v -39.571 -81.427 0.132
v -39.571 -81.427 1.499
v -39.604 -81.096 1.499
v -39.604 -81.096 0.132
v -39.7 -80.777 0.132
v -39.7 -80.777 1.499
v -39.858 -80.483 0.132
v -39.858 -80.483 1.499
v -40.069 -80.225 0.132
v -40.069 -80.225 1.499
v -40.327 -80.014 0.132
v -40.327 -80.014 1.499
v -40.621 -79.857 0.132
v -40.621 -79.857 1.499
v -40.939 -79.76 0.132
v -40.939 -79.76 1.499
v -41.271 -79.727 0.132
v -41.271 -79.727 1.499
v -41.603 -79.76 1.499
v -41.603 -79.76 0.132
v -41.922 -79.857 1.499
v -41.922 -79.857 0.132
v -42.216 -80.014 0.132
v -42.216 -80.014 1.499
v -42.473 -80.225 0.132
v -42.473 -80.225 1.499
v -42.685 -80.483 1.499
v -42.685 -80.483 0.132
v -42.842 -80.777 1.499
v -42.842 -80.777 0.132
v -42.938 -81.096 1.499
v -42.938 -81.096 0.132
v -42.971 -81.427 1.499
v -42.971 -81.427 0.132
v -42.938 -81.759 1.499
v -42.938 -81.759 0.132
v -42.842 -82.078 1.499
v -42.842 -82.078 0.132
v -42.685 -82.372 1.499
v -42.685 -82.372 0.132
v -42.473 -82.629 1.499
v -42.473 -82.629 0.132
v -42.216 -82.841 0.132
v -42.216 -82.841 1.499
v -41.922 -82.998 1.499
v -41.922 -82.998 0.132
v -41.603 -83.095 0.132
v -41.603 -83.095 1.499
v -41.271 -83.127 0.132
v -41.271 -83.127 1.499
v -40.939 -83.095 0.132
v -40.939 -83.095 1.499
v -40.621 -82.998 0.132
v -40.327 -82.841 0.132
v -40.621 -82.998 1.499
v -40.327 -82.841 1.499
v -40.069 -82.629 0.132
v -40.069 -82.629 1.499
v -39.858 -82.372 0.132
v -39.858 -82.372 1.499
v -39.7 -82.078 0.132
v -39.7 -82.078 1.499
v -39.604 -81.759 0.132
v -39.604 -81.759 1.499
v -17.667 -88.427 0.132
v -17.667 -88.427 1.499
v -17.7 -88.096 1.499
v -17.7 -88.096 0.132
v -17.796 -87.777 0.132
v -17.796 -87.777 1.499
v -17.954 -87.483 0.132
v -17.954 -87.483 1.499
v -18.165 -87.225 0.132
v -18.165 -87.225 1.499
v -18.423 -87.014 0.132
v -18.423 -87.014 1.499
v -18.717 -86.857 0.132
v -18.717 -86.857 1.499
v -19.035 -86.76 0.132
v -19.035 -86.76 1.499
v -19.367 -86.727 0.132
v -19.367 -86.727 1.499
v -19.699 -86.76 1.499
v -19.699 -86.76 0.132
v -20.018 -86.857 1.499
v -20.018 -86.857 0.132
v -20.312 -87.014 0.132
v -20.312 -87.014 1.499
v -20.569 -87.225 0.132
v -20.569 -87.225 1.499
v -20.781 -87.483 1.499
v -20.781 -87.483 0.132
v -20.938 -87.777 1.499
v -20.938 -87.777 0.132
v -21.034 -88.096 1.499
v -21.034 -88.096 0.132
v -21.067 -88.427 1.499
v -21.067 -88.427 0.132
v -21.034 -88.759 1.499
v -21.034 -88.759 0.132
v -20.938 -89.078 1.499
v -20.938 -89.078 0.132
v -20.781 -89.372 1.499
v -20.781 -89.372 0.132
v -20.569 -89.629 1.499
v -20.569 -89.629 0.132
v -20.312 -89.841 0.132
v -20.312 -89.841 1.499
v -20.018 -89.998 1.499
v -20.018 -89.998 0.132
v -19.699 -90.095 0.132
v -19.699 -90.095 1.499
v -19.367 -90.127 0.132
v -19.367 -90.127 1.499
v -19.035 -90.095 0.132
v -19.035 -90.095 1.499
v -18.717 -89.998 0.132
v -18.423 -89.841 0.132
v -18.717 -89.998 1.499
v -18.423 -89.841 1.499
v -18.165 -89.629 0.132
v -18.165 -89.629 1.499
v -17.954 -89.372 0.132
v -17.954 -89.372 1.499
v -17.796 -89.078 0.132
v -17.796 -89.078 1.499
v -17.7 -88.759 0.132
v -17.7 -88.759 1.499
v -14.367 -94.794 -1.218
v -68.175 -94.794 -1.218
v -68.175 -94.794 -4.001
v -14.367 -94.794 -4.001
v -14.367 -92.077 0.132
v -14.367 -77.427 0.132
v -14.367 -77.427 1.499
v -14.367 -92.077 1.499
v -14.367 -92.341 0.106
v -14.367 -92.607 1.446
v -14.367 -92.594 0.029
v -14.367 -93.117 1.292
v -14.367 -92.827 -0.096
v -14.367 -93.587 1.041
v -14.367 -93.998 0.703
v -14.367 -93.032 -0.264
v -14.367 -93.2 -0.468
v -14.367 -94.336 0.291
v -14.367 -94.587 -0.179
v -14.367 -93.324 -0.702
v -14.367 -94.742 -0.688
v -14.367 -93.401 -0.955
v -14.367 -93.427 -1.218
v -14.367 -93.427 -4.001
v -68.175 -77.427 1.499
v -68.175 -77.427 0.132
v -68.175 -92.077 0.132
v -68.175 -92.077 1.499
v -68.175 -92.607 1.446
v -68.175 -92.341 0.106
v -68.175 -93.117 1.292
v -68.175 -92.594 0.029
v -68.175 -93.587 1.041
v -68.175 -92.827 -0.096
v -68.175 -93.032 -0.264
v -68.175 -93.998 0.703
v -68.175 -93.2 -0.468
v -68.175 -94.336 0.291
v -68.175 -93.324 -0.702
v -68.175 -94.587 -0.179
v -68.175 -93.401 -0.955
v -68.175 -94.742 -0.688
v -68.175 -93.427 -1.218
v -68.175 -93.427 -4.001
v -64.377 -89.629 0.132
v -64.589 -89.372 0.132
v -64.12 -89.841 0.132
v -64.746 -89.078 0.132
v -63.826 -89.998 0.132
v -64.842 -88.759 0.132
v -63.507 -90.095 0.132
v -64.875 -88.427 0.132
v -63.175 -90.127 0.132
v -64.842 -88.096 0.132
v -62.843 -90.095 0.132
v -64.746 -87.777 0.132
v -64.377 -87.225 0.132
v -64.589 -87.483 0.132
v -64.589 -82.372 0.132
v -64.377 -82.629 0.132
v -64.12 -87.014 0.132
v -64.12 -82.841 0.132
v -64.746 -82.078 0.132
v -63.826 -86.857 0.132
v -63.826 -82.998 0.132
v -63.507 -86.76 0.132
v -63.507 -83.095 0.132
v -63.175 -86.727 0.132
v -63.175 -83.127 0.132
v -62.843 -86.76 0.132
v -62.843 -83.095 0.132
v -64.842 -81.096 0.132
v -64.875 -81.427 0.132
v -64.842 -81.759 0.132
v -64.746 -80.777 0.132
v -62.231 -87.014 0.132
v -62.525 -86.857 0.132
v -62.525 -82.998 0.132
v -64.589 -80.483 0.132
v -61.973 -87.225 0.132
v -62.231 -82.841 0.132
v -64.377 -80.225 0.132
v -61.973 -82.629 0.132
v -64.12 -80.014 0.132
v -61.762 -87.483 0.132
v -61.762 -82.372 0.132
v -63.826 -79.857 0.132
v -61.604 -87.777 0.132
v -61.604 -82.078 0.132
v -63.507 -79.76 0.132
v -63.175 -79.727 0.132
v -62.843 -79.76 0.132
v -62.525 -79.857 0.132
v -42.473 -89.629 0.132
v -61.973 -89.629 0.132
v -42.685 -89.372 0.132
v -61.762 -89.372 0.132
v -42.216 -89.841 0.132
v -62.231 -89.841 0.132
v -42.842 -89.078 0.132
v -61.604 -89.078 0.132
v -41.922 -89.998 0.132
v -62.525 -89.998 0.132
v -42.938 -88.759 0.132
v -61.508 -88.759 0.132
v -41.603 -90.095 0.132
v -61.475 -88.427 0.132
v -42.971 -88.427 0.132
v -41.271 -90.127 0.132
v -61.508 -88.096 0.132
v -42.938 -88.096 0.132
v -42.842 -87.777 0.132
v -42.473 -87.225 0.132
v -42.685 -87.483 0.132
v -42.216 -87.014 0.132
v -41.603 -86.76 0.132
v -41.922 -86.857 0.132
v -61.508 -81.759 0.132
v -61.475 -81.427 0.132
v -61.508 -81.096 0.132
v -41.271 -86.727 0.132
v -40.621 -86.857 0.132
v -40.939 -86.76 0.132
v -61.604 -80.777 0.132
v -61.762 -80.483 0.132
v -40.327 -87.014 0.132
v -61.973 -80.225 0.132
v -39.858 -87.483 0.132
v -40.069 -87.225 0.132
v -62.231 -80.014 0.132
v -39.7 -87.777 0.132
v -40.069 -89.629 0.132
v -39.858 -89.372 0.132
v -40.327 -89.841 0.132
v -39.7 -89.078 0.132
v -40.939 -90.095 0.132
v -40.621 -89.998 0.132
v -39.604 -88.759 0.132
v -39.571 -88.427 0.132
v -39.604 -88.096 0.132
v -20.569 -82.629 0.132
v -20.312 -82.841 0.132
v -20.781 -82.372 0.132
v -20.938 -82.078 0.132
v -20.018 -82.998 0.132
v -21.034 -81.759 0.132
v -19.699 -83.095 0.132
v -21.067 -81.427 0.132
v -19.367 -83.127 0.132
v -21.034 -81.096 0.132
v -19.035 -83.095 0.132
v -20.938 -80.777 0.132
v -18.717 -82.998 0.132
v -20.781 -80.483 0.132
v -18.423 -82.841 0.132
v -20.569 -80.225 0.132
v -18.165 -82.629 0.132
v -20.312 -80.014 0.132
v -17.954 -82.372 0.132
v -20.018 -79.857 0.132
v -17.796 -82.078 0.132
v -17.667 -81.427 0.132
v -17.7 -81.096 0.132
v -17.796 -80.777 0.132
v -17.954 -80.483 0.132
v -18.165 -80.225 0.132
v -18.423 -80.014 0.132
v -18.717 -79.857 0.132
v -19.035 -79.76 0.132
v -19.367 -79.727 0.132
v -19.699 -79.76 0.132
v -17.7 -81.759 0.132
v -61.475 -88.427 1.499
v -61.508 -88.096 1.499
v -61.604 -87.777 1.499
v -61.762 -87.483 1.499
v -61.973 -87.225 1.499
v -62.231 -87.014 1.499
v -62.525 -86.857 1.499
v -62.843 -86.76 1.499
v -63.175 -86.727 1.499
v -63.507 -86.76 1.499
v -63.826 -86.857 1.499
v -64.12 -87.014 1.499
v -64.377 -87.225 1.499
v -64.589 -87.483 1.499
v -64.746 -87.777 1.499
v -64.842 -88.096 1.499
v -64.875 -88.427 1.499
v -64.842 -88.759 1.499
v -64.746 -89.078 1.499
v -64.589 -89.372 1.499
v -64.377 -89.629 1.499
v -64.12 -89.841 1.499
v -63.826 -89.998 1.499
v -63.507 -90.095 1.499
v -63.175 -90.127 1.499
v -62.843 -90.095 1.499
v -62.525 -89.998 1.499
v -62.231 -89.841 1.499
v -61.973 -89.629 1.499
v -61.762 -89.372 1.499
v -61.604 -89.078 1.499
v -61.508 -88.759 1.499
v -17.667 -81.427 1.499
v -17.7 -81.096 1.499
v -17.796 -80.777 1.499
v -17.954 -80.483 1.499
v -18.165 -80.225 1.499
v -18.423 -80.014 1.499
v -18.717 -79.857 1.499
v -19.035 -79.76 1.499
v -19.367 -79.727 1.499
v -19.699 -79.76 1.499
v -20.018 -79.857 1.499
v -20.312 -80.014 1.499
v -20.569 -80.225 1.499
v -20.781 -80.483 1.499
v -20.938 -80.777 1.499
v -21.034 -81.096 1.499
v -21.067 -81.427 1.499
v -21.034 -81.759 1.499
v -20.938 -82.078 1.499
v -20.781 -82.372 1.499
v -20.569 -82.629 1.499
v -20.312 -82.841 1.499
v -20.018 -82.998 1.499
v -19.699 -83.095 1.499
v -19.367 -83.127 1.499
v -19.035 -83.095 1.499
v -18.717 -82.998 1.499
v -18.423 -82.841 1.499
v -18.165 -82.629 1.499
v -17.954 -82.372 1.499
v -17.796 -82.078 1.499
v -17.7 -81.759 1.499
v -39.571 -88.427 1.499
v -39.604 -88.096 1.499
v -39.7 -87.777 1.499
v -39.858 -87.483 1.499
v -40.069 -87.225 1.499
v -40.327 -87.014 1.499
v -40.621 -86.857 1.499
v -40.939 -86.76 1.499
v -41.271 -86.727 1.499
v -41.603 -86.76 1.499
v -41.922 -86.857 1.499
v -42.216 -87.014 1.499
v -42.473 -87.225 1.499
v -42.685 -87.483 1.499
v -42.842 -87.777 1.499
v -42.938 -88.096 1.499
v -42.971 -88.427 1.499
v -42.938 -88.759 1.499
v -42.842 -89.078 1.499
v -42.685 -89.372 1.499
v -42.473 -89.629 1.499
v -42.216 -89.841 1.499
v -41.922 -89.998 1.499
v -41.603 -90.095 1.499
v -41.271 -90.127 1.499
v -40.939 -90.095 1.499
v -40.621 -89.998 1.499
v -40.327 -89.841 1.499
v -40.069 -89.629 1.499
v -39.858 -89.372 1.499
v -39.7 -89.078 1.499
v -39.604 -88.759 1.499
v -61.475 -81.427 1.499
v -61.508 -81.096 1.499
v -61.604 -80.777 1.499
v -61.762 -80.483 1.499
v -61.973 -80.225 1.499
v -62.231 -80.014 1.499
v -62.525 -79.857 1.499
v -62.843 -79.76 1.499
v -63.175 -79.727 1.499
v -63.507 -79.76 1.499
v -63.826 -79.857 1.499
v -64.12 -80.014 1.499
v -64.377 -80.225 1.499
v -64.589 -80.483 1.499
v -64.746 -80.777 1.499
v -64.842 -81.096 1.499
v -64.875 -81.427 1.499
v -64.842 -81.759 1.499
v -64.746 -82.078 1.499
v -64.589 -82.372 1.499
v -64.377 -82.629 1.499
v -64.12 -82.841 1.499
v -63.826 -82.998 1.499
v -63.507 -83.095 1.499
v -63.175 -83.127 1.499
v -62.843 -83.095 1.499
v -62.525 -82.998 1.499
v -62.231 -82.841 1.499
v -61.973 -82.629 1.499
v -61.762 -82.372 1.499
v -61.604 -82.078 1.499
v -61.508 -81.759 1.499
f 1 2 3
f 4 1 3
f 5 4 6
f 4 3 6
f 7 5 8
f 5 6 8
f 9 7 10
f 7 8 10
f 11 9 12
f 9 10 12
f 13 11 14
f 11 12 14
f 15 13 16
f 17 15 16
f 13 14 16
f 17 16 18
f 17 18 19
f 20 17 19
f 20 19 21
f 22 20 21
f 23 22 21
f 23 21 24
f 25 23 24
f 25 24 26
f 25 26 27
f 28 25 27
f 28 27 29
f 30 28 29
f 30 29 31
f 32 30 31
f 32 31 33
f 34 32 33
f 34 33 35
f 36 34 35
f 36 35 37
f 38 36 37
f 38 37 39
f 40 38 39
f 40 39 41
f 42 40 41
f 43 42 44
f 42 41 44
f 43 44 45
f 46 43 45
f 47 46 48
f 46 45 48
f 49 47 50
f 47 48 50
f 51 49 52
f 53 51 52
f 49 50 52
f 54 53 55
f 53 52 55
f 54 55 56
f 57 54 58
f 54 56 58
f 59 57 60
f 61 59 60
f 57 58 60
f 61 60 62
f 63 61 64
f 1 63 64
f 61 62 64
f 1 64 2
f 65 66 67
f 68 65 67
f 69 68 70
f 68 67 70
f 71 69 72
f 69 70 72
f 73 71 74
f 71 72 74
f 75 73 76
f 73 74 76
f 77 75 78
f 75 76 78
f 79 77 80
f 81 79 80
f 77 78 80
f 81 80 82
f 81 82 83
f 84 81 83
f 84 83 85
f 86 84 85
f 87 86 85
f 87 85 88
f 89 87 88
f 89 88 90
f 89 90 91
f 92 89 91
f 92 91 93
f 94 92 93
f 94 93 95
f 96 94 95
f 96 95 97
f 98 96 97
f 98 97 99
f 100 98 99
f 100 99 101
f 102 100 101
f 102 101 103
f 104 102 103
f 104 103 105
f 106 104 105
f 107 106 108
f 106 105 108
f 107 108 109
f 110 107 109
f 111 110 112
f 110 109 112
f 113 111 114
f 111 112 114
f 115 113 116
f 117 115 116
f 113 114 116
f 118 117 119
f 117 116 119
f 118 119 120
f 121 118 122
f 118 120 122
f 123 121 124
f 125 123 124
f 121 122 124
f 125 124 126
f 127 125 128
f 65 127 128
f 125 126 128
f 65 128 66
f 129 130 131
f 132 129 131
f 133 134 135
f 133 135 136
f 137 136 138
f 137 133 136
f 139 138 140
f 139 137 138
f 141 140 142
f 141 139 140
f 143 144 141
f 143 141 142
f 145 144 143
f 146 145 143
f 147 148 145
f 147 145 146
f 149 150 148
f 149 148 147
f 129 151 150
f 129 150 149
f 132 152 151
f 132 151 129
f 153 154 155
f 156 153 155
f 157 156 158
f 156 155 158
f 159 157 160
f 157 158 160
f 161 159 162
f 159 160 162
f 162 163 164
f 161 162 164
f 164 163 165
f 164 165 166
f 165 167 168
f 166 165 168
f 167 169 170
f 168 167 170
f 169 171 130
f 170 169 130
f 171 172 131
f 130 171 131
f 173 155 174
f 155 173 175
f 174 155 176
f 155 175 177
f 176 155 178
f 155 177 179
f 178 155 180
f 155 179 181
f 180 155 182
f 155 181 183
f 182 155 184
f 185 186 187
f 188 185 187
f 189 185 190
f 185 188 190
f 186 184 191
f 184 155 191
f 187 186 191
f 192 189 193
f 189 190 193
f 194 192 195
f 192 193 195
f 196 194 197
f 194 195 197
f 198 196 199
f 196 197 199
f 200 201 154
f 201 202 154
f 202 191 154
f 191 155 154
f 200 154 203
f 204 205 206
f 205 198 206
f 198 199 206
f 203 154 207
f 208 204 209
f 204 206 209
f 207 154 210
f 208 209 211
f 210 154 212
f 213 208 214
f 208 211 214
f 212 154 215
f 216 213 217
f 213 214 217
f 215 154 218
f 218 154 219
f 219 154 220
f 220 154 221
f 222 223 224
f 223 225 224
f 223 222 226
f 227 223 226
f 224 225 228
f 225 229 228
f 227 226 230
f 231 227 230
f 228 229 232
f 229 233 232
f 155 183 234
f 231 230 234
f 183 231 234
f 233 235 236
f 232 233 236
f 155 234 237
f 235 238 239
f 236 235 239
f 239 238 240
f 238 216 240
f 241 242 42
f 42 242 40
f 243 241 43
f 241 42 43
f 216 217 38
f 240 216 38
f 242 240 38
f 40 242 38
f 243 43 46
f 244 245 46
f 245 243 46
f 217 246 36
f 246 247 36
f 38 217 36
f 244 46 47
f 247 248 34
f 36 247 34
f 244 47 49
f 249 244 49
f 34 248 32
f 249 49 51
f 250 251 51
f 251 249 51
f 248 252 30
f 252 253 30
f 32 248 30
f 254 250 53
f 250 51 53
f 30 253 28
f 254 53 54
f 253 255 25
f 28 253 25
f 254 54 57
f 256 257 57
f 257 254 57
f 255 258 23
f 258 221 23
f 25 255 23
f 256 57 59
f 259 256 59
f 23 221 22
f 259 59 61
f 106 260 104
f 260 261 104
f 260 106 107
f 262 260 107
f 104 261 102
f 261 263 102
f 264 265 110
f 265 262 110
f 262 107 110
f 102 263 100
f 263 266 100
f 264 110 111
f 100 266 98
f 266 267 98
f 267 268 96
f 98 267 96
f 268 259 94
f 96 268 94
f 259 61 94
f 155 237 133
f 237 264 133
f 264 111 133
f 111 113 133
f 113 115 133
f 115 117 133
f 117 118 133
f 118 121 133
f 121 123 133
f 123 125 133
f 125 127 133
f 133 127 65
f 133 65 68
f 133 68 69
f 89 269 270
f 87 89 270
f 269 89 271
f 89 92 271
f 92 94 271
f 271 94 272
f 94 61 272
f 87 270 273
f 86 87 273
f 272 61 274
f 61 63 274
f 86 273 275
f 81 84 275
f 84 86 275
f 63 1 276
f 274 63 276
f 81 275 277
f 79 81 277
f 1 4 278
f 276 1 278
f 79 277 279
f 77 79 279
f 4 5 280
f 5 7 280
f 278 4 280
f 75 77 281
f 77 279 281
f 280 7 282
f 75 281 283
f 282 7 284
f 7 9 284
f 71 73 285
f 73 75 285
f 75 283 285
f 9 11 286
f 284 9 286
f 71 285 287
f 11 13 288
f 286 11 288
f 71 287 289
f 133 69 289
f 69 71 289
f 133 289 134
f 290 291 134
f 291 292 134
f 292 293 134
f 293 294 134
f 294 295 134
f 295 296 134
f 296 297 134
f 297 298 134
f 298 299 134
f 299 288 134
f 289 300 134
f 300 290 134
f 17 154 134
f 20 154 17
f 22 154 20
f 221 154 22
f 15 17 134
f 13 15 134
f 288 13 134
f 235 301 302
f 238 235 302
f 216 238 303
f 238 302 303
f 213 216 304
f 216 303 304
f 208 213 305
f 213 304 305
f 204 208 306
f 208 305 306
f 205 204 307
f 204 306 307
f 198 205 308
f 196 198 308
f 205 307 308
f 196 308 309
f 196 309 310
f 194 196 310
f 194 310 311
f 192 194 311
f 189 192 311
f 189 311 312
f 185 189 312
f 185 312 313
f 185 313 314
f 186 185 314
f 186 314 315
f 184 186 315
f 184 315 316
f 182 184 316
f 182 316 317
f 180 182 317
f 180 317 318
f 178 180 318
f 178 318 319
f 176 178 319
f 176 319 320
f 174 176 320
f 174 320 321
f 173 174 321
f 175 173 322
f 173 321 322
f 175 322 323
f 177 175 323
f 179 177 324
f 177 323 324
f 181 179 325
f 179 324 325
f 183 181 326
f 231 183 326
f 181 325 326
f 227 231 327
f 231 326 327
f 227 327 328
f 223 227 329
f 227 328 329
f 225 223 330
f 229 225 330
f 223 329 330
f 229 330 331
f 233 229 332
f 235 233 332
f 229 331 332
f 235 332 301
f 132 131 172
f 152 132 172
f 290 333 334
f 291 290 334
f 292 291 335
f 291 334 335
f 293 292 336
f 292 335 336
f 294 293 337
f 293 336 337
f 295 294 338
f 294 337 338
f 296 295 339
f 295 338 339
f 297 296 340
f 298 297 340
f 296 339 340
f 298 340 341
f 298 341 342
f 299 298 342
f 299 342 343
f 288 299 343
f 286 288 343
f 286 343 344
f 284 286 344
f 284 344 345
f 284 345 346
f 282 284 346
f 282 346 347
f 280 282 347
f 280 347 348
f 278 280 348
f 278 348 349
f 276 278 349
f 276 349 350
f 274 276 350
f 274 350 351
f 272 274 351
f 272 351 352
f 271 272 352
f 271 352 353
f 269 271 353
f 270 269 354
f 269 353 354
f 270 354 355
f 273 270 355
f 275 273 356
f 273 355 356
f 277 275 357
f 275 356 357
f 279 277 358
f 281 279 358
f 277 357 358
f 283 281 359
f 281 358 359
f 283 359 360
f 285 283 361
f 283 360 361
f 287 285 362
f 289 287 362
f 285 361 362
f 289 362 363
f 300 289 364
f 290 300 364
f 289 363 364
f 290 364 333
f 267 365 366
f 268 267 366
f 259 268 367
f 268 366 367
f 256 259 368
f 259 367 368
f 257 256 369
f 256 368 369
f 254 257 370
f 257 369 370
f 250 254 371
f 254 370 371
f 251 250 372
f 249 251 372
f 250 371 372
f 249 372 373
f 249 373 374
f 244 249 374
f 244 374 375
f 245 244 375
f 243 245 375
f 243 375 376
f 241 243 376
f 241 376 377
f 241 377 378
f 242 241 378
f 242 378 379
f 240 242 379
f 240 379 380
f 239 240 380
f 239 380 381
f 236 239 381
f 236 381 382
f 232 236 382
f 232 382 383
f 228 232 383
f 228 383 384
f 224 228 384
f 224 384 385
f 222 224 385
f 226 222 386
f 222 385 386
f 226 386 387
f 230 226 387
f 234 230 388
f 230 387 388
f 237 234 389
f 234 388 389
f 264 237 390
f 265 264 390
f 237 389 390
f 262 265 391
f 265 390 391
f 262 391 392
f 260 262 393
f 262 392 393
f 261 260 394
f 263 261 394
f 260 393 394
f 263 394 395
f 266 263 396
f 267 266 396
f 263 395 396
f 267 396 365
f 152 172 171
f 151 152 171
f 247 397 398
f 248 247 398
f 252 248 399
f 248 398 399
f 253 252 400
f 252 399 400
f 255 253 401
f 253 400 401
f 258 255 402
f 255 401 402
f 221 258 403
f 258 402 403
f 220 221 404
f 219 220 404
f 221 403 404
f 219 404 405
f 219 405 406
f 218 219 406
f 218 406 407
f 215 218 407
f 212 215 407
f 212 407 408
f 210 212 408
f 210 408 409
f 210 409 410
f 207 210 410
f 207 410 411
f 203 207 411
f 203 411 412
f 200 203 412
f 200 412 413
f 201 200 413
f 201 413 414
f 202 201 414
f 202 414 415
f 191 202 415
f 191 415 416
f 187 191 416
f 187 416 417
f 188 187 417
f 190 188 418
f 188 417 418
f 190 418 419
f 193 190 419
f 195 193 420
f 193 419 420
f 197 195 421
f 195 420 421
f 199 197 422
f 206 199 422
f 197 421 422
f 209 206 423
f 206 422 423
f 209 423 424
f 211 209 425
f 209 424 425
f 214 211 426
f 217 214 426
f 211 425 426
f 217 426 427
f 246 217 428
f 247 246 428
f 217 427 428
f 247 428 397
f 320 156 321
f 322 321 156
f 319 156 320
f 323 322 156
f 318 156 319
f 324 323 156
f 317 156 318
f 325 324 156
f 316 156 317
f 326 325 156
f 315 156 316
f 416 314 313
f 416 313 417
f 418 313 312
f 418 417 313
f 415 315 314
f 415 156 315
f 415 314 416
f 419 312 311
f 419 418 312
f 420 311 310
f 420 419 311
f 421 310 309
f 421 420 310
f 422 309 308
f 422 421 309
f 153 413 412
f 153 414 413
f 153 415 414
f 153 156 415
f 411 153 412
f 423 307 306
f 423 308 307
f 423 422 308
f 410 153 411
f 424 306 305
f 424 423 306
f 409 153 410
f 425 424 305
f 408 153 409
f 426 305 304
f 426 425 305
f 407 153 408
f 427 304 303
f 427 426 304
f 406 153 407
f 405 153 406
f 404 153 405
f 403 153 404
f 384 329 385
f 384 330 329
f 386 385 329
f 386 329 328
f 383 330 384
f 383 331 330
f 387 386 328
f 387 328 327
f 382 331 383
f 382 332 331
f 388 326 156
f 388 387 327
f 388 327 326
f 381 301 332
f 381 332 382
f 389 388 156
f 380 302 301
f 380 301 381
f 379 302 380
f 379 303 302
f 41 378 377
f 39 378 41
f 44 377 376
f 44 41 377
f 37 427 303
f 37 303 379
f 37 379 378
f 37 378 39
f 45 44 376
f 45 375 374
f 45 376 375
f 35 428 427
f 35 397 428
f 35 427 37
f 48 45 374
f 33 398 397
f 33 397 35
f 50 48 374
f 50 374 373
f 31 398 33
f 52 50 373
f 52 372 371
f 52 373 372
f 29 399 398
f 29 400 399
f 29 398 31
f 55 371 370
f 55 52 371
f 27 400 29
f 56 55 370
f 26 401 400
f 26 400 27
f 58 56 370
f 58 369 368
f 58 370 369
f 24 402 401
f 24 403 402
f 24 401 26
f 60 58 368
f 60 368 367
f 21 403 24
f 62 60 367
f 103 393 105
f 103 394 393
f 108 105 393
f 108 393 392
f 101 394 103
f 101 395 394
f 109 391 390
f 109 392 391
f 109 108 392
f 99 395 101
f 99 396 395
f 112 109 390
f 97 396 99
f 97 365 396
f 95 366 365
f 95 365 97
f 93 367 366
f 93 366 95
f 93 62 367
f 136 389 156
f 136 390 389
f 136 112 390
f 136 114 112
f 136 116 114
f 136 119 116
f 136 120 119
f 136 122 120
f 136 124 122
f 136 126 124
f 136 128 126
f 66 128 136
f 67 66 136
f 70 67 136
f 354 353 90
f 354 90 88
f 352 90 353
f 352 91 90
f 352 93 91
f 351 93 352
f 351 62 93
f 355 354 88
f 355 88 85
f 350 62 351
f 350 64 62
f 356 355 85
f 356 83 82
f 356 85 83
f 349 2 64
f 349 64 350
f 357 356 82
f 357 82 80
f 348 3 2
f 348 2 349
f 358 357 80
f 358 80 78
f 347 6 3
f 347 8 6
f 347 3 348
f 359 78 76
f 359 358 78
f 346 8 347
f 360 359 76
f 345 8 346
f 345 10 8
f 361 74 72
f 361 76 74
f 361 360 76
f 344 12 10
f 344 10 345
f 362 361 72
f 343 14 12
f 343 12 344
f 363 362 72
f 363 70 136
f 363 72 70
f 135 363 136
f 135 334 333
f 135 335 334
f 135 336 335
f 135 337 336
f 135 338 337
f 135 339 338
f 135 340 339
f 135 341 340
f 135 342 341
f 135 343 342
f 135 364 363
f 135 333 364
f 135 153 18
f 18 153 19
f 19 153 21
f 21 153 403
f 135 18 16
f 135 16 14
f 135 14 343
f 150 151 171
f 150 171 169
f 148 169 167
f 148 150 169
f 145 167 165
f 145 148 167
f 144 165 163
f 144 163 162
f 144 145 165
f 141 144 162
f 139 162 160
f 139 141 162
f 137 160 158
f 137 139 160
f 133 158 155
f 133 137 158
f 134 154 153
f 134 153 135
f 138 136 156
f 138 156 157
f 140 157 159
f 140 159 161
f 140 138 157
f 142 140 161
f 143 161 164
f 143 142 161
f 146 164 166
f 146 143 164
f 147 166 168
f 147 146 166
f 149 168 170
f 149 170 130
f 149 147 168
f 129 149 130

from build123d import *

# Parameters (mm, degrees)
SKETCH1_W                    = 53.808
SKETCH1_H                    = 16
BOSS_EXTRUDE1_DEPTH          = 1.4986
CONVERT_SOLID1_OUTLINE_W     = 53.808
CONVERT_SOLID1_OUTLINE_H     = 16
CONVERT_SOLID1_DEPTH         = 0.1316
EDGE_FLANGE1_STRIP_W         = 8.168
EDGE_FLANGE1_STRIP_H         = 1.367
EDGE_FLANGE1_STRIP_CUT_DEPTH = 53.808
EDGE_FLANGE1_DEPTH           = 53.808
M3_CLEARANCE_HOLE1_D         = 3.4


# Read off the part's stored shape, not the designer's step: Convert-Solid1
# Sheet-metal steps are written as plain solids
with BuildPart() as part:
    # Sketch1 → Boss-Extrude1 (new body)
    with BuildSketch(Plane.XY):
        with Locations((-41.271079995, -85.427168175)):
            Rectangle(SKETCH1_W, SKETCH1_H)
    extrude(amount=BOSS_EXTRUDE1_DEPTH)

    # Convert-Solid1 outline → Convert-Solid1 (cut)
    with BuildSketch(Plane.XY):
        with Locations((-41.271079995, -85.427168175)):
            Rectangle(CONVERT_SOLID1_OUTLINE_W, CONVERT_SOLID1_OUTLINE_H)
    extrude(amount=CONVERT_SOLID1_DEPTH, mode=Mode.SUBTRACT)

    # Edge-Flange1 strip (across the edge) → Edge-Flange1 strip cut (cut)
    with BuildSketch(Plane(origin=(-14.367079995, -93.427168175, 0.1316), x_dir=(0, 1, 0), z_dir=(-1, 0, 0))):
        with Locations((-2.734, -0.6835)):
            Rectangle(EDGE_FLANGE1_STRIP_W, EDGE_FLANGE1_STRIP_H)
    extrude(amount=EDGE_FLANGE1_STRIP_CUT_DEPTH, mode=Mode.SUBTRACT)

    # Edge-Flange1 section (across the edge) → Edge-Flange1 (add)
    with BuildSketch(Plane(origin=(-14.367079995, -93.427168175, 0.1316), x_dir=(0, 1, 0), z_dir=(-1, 0, 0))):
        with BuildLine():
            Line((-1.367, 1.35), (-1.367, 4.133))
            Line((-1.367, 4.133), (0, 4.133))
            Line((0, 4.133), (0, 1.35))
            ThreePointArc((0, 1.35), (0.395405845, 0.395405845), (1.35, 0))
            Line((1.35, 0), (1.35, -1.367))
            ThreePointArc((1.35, -1.367), (-0.571209124, -0.571209124), (-1.367, 1.35))
        make_face()
    extrude(amount=EDGE_FLANGE1_DEPTH)

    # M3 Clearance Hole1 (through all)
    with Locations(Plane(origin=(0, 0, 0.1316), x_dir=(-1, 0, 0), z_dir=(0, 0, -1))):
        with Locations((19.367079995, -81.427168175), (19.367079995, -88.427168175), (63.175079995, -88.427168175), (63.175079995, -81.427168175), (41.271079995, -88.427168175), (41.271079995, -81.427168175)):
            Hole(M3_CLEARANCE_HOLE1_D / 2)


solid = part.part
